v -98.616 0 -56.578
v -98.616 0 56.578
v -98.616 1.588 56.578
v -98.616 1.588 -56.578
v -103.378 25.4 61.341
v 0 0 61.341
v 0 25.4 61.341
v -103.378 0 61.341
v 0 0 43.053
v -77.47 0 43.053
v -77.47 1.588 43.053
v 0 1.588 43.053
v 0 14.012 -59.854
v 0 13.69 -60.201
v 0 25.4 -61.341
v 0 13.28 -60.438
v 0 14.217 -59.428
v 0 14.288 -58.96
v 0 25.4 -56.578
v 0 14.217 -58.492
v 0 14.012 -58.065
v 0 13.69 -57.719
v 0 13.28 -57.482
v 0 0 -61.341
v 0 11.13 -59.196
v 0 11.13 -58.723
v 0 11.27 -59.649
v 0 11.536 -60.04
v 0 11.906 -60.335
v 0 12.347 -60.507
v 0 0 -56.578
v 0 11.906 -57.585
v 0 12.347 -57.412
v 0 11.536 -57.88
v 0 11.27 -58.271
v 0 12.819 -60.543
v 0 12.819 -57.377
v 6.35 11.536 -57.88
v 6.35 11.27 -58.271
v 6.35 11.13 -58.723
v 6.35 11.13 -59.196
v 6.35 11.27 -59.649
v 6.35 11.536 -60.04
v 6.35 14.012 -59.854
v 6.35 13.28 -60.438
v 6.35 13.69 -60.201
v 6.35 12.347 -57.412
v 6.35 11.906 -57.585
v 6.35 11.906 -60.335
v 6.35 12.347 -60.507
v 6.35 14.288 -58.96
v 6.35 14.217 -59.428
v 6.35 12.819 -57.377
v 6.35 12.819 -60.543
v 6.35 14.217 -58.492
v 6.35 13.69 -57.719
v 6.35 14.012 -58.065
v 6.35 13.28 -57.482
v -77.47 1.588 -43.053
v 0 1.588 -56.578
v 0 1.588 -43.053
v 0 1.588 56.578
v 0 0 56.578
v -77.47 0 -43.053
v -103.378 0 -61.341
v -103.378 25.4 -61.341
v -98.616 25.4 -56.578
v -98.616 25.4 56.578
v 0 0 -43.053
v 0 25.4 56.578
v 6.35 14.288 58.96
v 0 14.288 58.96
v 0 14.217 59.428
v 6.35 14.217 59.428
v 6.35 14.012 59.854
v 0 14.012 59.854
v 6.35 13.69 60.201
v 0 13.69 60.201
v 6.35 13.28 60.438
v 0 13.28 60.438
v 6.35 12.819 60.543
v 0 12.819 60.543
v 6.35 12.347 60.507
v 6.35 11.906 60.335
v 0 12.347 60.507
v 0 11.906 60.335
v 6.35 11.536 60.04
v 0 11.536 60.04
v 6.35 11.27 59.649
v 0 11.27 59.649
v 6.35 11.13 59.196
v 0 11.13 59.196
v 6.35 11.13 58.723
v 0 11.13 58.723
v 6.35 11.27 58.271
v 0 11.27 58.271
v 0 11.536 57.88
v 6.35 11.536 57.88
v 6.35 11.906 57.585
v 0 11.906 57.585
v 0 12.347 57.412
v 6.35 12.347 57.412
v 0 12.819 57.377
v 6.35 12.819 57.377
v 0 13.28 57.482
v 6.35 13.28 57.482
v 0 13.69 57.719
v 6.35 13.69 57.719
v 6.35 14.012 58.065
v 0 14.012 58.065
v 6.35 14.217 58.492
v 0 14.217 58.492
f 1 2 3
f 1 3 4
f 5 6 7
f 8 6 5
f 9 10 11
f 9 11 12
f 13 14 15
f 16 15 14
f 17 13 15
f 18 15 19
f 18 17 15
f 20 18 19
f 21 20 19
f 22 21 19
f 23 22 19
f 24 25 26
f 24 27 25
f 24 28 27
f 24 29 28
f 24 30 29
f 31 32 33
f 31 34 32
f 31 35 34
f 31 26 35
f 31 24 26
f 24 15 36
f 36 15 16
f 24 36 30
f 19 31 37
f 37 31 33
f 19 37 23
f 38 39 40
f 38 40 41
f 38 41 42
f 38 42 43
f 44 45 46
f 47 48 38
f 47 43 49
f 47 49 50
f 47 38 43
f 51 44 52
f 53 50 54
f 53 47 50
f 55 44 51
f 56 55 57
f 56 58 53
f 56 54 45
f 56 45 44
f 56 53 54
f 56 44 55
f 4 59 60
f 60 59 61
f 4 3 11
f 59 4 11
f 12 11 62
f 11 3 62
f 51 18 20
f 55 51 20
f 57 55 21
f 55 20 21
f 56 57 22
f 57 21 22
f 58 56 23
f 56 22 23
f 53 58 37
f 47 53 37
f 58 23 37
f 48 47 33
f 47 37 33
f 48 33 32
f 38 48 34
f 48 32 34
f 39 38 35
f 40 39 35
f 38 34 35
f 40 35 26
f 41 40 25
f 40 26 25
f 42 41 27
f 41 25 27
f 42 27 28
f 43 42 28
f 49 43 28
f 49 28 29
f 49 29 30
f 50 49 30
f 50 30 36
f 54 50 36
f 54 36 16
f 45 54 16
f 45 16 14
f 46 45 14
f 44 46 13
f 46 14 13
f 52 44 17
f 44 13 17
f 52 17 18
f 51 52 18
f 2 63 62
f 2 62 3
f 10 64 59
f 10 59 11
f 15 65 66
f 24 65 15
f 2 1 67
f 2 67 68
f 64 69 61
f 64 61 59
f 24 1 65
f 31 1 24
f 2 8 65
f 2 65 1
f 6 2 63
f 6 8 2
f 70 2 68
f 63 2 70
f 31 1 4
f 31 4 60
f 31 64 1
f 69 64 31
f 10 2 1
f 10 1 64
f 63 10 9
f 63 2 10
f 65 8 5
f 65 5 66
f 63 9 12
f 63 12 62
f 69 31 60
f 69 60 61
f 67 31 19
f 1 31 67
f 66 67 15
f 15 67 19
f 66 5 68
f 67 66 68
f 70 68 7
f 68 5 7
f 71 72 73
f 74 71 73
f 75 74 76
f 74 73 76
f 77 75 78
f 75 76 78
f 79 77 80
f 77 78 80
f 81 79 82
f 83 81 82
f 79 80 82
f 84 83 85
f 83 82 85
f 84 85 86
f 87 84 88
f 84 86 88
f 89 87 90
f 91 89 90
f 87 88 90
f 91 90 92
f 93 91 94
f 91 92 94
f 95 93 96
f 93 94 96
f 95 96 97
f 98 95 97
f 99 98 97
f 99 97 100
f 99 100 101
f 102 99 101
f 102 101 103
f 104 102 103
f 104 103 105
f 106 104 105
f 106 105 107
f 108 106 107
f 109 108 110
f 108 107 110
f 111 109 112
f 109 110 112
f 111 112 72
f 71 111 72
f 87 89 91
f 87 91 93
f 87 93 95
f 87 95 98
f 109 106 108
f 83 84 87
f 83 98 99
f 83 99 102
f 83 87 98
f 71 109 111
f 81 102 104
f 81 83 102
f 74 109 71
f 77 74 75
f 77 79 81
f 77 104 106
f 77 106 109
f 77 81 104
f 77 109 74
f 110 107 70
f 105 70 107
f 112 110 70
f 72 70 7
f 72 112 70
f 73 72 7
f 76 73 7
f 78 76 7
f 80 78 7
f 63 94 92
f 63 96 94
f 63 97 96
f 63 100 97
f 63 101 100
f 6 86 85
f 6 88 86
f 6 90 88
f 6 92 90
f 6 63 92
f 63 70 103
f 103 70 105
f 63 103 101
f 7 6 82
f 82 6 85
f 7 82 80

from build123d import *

# Parameters (mm, degrees)
F1_DEPTH = 1.5875
F2_DEPTH = 25.4
F3_R     = 1.5875
F4_DEPTH = 6.35
F5_R     = 1.5875
F6_DEPTH = 6.35


with BuildPart() as f1:
    # F0 (on Front) → F1 (new body)
    with BuildSketch(Plane.XZ):
        Polygon((-77.47, 43.053), (0, 43.053), (0, 54.991), (-97.028, 54.991), (-97.028, -54.991), (0, -54.991), (0, -43.053), (-77.47, -43.053), align=None)
        Polygon((-97.028, 54.991), (0, 54.991), (0, 56.5785), (-98.6155, 56.5785), (-98.6155, -56.5785), (0, -56.5785), (0, -54.991), (-97.028, -54.991), align=None)
    extrude(amount=-F1_DEPTH)


with BuildPart() as f2:
    # F0 (on Front) → F2 (new body)
    with BuildSketch(Plane.XZ):
        Polygon((-98.6155, 56.5785), (0, 56.5785), (0, 61.341), (-103.378, 61.341), (-103.378, -61.341), (0, -61.341), (0, -56.5785), (-98.6155, -56.5785), align=None)
    extrude(amount=-F2_DEPTH)

    # F3 (on face) → F4 (join)
    with BuildSketch(Plane.YZ):
        with Locations((12.7, -58.95975)):
            Circle(F3_R)
    extrude(amount=F4_DEPTH)

    # F5 (on face) → F6 (join)
    with BuildSketch(Plane.YZ):
        with Locations((12.7, 58.95975)):
            Circle(F5_R)
    extrude(amount=F6_DEPTH)


solid = Compound([f1.part, f2.part])
